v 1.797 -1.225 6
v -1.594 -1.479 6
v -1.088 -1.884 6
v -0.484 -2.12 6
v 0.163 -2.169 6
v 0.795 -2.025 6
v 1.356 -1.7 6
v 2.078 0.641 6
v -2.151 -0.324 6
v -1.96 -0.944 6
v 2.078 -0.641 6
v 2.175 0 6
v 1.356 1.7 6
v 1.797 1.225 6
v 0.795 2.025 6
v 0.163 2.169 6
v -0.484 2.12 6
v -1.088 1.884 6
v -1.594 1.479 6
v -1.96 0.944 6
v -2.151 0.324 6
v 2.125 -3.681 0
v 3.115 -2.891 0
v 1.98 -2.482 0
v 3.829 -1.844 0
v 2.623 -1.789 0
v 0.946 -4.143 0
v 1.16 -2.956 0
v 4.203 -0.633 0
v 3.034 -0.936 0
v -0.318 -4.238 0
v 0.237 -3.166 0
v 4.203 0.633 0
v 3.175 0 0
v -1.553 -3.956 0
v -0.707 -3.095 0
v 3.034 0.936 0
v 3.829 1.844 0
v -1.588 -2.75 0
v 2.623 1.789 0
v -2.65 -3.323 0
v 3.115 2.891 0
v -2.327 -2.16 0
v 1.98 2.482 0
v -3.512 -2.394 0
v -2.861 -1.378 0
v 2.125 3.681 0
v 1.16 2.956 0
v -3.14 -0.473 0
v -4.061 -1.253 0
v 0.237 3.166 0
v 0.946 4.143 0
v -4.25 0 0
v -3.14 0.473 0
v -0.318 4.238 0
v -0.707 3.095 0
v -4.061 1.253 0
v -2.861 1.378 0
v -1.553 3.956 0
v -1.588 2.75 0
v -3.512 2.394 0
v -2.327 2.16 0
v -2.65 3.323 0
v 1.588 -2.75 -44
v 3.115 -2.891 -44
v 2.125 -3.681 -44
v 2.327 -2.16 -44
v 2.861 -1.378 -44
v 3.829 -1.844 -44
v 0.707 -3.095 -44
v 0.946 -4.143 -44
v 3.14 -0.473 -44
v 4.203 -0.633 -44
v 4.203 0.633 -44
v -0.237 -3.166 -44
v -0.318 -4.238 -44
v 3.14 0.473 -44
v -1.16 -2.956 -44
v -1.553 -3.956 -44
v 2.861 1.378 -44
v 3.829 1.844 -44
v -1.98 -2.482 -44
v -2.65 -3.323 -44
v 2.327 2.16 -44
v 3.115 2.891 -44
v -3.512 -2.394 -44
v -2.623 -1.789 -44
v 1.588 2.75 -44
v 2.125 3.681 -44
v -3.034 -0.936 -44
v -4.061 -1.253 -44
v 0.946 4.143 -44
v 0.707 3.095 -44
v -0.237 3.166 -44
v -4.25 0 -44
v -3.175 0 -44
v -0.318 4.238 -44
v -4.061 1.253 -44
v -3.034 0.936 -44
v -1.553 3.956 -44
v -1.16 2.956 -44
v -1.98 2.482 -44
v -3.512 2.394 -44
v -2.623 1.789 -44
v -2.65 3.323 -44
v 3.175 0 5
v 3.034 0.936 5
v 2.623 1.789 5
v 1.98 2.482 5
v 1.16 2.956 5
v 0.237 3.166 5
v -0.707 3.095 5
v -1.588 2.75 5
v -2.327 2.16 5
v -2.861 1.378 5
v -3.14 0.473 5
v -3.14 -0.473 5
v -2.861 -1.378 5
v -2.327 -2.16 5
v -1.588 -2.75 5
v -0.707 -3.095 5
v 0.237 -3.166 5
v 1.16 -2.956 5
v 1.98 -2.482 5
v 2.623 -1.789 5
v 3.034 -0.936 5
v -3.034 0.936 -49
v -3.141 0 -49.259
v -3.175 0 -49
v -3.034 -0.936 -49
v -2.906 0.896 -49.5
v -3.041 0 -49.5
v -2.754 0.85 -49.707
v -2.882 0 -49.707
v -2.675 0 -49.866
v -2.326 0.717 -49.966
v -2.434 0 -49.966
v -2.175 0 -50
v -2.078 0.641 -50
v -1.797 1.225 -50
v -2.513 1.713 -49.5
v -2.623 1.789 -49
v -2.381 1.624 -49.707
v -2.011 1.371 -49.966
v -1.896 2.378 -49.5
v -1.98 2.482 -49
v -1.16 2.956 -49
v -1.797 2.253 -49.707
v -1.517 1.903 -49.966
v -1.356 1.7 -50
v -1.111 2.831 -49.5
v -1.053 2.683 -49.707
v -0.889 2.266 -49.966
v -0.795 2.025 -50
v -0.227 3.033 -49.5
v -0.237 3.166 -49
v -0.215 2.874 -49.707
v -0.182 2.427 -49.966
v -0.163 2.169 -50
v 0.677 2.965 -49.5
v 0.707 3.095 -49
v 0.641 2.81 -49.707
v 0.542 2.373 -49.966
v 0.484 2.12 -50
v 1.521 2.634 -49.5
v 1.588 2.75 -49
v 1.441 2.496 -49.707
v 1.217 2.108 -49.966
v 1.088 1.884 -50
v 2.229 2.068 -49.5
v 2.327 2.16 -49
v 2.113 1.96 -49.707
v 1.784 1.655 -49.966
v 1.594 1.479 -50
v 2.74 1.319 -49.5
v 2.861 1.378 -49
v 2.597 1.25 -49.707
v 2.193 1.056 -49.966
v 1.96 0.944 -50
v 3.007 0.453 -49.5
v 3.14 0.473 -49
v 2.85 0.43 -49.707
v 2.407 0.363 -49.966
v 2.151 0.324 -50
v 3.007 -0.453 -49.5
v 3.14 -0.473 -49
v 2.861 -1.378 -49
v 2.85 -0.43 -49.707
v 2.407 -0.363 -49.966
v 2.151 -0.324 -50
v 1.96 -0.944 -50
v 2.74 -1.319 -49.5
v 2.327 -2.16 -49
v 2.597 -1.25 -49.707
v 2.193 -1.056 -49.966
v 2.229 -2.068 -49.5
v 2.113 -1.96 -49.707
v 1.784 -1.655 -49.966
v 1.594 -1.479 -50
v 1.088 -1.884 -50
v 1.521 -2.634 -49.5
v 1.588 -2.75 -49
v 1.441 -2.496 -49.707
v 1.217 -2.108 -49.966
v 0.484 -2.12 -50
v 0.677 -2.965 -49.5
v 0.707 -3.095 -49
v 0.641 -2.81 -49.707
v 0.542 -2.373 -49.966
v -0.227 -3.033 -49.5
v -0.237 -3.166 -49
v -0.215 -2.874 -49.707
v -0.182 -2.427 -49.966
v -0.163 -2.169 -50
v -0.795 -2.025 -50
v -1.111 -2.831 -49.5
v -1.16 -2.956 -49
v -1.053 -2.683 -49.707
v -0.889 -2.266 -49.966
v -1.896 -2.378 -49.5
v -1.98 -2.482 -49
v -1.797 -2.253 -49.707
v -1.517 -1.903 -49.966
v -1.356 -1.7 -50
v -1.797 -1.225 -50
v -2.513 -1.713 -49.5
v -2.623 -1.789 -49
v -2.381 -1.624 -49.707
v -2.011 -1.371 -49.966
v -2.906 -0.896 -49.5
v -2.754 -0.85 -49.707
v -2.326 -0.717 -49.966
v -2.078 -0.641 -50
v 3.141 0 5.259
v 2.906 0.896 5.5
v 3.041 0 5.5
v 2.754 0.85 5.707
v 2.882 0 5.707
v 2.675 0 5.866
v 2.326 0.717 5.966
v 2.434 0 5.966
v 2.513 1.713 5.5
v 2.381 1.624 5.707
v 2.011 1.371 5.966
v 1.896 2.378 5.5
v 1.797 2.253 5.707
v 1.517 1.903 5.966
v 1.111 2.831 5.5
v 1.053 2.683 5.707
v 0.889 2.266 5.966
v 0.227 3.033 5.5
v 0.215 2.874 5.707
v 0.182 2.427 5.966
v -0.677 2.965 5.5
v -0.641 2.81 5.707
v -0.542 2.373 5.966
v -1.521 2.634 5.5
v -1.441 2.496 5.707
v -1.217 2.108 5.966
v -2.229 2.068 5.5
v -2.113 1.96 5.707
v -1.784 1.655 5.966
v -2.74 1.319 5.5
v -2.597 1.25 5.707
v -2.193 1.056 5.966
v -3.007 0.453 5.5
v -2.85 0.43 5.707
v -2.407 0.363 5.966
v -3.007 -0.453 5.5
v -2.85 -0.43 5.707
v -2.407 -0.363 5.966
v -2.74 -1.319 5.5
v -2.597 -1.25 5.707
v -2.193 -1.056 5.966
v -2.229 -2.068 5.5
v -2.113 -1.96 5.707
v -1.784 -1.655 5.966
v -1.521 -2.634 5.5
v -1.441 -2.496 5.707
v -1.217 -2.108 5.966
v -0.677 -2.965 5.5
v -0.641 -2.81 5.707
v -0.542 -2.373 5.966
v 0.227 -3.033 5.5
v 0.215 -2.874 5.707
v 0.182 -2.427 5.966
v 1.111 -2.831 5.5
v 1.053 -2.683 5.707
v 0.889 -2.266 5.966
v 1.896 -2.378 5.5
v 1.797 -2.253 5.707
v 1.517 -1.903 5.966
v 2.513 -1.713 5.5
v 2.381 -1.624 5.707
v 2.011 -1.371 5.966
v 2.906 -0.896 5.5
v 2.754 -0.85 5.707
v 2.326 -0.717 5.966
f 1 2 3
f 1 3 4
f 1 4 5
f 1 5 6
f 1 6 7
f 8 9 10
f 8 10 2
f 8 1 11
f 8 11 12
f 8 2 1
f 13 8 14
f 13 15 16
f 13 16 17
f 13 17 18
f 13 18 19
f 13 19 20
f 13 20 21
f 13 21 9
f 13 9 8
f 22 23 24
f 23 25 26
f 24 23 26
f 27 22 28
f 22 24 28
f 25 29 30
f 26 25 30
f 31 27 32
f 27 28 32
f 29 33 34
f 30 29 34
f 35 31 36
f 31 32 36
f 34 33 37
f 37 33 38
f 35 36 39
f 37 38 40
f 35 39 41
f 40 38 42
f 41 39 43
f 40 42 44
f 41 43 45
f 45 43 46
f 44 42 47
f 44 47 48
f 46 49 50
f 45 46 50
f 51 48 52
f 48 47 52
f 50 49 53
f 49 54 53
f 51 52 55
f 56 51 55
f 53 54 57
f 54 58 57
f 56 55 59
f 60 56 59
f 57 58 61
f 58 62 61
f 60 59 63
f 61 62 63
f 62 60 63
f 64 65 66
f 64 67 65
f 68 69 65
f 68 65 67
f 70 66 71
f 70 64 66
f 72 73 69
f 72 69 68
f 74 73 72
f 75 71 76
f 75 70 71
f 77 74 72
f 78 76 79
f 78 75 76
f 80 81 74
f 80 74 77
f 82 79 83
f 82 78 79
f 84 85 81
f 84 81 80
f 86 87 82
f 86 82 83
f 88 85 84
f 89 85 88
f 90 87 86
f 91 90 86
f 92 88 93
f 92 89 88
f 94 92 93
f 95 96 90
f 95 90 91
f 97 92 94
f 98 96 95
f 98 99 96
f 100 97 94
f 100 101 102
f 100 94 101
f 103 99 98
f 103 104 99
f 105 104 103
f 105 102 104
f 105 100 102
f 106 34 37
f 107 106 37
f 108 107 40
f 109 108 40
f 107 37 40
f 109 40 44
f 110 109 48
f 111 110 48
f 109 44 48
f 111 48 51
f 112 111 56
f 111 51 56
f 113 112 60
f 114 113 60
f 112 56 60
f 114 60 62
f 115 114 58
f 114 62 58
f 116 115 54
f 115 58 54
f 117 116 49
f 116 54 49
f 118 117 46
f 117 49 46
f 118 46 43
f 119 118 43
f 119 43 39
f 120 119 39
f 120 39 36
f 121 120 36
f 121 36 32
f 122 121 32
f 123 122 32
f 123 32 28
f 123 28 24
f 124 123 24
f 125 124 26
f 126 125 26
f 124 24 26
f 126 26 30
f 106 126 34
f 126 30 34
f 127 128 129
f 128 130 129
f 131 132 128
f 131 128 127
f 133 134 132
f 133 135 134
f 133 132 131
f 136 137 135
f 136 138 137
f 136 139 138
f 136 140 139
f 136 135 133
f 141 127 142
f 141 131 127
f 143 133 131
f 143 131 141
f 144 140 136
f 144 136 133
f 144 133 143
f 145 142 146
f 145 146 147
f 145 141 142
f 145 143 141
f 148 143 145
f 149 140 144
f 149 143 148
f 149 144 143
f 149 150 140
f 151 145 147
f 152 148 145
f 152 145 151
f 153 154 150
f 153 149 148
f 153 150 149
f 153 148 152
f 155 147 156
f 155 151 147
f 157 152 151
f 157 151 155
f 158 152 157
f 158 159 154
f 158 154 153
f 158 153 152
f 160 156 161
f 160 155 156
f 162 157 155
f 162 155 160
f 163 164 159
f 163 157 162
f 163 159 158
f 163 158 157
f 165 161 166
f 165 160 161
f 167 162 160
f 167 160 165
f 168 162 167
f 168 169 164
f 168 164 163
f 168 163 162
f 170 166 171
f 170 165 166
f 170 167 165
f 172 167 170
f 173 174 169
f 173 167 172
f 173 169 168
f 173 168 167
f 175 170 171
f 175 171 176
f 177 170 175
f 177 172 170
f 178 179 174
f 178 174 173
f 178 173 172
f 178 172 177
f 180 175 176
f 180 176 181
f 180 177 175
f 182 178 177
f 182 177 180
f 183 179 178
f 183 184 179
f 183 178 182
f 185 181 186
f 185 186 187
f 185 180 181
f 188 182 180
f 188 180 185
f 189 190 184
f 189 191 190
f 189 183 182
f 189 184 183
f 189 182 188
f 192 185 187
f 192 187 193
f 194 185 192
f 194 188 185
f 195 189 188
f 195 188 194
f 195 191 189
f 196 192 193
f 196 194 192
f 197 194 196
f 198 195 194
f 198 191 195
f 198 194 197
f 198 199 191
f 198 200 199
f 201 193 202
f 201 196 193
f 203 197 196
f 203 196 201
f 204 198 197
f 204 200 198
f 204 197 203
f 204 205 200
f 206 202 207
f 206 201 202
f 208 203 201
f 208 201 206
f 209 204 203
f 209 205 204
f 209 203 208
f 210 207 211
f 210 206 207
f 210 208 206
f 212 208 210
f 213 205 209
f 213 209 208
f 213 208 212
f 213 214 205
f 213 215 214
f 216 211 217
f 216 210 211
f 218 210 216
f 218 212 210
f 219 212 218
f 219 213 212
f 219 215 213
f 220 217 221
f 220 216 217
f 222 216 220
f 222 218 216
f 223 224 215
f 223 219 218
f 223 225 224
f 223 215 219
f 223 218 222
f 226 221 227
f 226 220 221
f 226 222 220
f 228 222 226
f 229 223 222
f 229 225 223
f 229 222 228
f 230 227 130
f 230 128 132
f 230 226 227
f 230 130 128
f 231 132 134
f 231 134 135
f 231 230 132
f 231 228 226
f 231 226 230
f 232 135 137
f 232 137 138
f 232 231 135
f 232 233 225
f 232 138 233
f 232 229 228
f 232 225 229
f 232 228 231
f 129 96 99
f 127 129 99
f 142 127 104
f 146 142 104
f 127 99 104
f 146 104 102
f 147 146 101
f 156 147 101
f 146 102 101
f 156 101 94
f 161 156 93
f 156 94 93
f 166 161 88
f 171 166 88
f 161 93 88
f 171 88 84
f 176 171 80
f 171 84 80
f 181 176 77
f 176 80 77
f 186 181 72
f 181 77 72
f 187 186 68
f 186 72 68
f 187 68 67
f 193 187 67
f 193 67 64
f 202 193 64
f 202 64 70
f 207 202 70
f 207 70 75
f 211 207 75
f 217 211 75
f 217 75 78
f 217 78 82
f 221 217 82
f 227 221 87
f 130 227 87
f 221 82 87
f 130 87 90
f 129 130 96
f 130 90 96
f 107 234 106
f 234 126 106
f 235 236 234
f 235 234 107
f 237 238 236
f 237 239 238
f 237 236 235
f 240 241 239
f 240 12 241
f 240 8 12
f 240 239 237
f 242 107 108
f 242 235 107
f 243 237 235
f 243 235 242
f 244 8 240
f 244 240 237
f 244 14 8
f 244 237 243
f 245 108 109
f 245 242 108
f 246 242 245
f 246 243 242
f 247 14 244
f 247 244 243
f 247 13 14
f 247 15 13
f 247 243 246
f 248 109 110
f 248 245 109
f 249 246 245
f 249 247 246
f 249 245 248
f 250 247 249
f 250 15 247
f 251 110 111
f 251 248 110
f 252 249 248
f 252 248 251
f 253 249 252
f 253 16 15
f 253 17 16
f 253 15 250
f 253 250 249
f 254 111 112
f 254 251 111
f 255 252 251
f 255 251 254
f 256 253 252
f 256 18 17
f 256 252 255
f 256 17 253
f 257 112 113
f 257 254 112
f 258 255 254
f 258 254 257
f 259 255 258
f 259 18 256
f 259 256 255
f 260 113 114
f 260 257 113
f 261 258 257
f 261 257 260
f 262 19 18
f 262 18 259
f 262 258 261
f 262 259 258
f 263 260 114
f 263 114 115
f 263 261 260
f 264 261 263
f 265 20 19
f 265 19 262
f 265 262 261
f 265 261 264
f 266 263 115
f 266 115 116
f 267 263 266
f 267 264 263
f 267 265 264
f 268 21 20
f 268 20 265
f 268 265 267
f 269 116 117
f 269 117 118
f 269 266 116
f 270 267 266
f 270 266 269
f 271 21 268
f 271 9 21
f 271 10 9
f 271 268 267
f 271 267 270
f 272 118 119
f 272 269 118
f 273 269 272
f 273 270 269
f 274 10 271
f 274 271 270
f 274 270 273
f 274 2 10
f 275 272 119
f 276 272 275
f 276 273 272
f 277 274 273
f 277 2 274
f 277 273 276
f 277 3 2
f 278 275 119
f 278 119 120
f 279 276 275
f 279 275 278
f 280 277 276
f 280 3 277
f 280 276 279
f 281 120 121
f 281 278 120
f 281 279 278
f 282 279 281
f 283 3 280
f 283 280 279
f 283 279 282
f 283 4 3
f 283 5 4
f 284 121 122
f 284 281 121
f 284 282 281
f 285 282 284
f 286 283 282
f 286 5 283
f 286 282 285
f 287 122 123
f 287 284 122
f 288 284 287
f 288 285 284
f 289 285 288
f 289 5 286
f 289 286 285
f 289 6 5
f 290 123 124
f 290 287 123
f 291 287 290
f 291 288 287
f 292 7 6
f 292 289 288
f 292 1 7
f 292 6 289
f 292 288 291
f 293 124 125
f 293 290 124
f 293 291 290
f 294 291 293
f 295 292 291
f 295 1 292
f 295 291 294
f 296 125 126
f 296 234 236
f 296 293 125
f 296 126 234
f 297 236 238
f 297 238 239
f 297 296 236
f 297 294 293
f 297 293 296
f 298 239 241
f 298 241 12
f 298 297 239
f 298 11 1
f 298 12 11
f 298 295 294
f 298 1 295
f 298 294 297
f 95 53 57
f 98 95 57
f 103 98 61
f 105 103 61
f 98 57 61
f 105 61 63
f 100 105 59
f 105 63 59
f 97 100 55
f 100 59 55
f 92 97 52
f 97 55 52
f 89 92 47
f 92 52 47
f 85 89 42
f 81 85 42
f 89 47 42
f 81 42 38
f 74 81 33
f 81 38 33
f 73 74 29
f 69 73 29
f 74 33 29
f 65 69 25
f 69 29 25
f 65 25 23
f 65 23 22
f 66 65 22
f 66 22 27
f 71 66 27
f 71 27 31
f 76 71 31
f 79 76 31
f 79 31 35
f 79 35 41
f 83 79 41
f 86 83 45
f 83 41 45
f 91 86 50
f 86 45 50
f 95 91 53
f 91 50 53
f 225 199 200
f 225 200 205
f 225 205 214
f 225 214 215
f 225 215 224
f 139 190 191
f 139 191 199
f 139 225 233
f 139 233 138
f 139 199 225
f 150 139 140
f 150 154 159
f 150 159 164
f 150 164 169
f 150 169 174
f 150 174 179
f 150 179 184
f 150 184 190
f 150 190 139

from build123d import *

# Parameters (mm, degrees)
SKETCH1_R           = 3.175
BOSS_EXTRUDE1_DEPTH = 6
SKETCH2_R           = 4.25
BOSS_EXTRUDE2_DEPTH = 44
SKETCH3_R           = 3.175
BOSS_EXTRUDE3_DEPTH = 6
FILLET1_R           = 1


with BuildPart() as part:
    # Sketch1 → Boss-Extrude1 (new body)
    with BuildSketch(Plane.XY):
        Circle(SKETCH1_R)
    extrude(amount=BOSS_EXTRUDE1_DEPTH)

    # Sketch2 → Boss-Extrude2 (add)
    with BuildSketch(Plane(origin=(0, 0, 0), x_dir=(-1, 0, 0), z_dir=(0, 0, -1))):
        Circle(SKETCH2_R)
    extrude(amount=BOSS_EXTRUDE2_DEPTH)

    # Sketch3 → Boss-Extrude3 (add)
    with BuildSketch(Plane(origin=(0, 0, -44), x_dir=(-1, 0, 0), z_dir=(0, 0, -1))):
        Circle(SKETCH3_R)
    extrude(amount=BOSS_EXTRUDE3_DEPTH)

    # Fillet1
    fillet1_edges = [part.edges().sort_by_distance(p)[0] for p in [
        (3.175, 0, -50),
        (-3.175, 0, 6),
    ]]
    fillet(fillet1_edges, radius=FILLET1_R)


solid = part.part
